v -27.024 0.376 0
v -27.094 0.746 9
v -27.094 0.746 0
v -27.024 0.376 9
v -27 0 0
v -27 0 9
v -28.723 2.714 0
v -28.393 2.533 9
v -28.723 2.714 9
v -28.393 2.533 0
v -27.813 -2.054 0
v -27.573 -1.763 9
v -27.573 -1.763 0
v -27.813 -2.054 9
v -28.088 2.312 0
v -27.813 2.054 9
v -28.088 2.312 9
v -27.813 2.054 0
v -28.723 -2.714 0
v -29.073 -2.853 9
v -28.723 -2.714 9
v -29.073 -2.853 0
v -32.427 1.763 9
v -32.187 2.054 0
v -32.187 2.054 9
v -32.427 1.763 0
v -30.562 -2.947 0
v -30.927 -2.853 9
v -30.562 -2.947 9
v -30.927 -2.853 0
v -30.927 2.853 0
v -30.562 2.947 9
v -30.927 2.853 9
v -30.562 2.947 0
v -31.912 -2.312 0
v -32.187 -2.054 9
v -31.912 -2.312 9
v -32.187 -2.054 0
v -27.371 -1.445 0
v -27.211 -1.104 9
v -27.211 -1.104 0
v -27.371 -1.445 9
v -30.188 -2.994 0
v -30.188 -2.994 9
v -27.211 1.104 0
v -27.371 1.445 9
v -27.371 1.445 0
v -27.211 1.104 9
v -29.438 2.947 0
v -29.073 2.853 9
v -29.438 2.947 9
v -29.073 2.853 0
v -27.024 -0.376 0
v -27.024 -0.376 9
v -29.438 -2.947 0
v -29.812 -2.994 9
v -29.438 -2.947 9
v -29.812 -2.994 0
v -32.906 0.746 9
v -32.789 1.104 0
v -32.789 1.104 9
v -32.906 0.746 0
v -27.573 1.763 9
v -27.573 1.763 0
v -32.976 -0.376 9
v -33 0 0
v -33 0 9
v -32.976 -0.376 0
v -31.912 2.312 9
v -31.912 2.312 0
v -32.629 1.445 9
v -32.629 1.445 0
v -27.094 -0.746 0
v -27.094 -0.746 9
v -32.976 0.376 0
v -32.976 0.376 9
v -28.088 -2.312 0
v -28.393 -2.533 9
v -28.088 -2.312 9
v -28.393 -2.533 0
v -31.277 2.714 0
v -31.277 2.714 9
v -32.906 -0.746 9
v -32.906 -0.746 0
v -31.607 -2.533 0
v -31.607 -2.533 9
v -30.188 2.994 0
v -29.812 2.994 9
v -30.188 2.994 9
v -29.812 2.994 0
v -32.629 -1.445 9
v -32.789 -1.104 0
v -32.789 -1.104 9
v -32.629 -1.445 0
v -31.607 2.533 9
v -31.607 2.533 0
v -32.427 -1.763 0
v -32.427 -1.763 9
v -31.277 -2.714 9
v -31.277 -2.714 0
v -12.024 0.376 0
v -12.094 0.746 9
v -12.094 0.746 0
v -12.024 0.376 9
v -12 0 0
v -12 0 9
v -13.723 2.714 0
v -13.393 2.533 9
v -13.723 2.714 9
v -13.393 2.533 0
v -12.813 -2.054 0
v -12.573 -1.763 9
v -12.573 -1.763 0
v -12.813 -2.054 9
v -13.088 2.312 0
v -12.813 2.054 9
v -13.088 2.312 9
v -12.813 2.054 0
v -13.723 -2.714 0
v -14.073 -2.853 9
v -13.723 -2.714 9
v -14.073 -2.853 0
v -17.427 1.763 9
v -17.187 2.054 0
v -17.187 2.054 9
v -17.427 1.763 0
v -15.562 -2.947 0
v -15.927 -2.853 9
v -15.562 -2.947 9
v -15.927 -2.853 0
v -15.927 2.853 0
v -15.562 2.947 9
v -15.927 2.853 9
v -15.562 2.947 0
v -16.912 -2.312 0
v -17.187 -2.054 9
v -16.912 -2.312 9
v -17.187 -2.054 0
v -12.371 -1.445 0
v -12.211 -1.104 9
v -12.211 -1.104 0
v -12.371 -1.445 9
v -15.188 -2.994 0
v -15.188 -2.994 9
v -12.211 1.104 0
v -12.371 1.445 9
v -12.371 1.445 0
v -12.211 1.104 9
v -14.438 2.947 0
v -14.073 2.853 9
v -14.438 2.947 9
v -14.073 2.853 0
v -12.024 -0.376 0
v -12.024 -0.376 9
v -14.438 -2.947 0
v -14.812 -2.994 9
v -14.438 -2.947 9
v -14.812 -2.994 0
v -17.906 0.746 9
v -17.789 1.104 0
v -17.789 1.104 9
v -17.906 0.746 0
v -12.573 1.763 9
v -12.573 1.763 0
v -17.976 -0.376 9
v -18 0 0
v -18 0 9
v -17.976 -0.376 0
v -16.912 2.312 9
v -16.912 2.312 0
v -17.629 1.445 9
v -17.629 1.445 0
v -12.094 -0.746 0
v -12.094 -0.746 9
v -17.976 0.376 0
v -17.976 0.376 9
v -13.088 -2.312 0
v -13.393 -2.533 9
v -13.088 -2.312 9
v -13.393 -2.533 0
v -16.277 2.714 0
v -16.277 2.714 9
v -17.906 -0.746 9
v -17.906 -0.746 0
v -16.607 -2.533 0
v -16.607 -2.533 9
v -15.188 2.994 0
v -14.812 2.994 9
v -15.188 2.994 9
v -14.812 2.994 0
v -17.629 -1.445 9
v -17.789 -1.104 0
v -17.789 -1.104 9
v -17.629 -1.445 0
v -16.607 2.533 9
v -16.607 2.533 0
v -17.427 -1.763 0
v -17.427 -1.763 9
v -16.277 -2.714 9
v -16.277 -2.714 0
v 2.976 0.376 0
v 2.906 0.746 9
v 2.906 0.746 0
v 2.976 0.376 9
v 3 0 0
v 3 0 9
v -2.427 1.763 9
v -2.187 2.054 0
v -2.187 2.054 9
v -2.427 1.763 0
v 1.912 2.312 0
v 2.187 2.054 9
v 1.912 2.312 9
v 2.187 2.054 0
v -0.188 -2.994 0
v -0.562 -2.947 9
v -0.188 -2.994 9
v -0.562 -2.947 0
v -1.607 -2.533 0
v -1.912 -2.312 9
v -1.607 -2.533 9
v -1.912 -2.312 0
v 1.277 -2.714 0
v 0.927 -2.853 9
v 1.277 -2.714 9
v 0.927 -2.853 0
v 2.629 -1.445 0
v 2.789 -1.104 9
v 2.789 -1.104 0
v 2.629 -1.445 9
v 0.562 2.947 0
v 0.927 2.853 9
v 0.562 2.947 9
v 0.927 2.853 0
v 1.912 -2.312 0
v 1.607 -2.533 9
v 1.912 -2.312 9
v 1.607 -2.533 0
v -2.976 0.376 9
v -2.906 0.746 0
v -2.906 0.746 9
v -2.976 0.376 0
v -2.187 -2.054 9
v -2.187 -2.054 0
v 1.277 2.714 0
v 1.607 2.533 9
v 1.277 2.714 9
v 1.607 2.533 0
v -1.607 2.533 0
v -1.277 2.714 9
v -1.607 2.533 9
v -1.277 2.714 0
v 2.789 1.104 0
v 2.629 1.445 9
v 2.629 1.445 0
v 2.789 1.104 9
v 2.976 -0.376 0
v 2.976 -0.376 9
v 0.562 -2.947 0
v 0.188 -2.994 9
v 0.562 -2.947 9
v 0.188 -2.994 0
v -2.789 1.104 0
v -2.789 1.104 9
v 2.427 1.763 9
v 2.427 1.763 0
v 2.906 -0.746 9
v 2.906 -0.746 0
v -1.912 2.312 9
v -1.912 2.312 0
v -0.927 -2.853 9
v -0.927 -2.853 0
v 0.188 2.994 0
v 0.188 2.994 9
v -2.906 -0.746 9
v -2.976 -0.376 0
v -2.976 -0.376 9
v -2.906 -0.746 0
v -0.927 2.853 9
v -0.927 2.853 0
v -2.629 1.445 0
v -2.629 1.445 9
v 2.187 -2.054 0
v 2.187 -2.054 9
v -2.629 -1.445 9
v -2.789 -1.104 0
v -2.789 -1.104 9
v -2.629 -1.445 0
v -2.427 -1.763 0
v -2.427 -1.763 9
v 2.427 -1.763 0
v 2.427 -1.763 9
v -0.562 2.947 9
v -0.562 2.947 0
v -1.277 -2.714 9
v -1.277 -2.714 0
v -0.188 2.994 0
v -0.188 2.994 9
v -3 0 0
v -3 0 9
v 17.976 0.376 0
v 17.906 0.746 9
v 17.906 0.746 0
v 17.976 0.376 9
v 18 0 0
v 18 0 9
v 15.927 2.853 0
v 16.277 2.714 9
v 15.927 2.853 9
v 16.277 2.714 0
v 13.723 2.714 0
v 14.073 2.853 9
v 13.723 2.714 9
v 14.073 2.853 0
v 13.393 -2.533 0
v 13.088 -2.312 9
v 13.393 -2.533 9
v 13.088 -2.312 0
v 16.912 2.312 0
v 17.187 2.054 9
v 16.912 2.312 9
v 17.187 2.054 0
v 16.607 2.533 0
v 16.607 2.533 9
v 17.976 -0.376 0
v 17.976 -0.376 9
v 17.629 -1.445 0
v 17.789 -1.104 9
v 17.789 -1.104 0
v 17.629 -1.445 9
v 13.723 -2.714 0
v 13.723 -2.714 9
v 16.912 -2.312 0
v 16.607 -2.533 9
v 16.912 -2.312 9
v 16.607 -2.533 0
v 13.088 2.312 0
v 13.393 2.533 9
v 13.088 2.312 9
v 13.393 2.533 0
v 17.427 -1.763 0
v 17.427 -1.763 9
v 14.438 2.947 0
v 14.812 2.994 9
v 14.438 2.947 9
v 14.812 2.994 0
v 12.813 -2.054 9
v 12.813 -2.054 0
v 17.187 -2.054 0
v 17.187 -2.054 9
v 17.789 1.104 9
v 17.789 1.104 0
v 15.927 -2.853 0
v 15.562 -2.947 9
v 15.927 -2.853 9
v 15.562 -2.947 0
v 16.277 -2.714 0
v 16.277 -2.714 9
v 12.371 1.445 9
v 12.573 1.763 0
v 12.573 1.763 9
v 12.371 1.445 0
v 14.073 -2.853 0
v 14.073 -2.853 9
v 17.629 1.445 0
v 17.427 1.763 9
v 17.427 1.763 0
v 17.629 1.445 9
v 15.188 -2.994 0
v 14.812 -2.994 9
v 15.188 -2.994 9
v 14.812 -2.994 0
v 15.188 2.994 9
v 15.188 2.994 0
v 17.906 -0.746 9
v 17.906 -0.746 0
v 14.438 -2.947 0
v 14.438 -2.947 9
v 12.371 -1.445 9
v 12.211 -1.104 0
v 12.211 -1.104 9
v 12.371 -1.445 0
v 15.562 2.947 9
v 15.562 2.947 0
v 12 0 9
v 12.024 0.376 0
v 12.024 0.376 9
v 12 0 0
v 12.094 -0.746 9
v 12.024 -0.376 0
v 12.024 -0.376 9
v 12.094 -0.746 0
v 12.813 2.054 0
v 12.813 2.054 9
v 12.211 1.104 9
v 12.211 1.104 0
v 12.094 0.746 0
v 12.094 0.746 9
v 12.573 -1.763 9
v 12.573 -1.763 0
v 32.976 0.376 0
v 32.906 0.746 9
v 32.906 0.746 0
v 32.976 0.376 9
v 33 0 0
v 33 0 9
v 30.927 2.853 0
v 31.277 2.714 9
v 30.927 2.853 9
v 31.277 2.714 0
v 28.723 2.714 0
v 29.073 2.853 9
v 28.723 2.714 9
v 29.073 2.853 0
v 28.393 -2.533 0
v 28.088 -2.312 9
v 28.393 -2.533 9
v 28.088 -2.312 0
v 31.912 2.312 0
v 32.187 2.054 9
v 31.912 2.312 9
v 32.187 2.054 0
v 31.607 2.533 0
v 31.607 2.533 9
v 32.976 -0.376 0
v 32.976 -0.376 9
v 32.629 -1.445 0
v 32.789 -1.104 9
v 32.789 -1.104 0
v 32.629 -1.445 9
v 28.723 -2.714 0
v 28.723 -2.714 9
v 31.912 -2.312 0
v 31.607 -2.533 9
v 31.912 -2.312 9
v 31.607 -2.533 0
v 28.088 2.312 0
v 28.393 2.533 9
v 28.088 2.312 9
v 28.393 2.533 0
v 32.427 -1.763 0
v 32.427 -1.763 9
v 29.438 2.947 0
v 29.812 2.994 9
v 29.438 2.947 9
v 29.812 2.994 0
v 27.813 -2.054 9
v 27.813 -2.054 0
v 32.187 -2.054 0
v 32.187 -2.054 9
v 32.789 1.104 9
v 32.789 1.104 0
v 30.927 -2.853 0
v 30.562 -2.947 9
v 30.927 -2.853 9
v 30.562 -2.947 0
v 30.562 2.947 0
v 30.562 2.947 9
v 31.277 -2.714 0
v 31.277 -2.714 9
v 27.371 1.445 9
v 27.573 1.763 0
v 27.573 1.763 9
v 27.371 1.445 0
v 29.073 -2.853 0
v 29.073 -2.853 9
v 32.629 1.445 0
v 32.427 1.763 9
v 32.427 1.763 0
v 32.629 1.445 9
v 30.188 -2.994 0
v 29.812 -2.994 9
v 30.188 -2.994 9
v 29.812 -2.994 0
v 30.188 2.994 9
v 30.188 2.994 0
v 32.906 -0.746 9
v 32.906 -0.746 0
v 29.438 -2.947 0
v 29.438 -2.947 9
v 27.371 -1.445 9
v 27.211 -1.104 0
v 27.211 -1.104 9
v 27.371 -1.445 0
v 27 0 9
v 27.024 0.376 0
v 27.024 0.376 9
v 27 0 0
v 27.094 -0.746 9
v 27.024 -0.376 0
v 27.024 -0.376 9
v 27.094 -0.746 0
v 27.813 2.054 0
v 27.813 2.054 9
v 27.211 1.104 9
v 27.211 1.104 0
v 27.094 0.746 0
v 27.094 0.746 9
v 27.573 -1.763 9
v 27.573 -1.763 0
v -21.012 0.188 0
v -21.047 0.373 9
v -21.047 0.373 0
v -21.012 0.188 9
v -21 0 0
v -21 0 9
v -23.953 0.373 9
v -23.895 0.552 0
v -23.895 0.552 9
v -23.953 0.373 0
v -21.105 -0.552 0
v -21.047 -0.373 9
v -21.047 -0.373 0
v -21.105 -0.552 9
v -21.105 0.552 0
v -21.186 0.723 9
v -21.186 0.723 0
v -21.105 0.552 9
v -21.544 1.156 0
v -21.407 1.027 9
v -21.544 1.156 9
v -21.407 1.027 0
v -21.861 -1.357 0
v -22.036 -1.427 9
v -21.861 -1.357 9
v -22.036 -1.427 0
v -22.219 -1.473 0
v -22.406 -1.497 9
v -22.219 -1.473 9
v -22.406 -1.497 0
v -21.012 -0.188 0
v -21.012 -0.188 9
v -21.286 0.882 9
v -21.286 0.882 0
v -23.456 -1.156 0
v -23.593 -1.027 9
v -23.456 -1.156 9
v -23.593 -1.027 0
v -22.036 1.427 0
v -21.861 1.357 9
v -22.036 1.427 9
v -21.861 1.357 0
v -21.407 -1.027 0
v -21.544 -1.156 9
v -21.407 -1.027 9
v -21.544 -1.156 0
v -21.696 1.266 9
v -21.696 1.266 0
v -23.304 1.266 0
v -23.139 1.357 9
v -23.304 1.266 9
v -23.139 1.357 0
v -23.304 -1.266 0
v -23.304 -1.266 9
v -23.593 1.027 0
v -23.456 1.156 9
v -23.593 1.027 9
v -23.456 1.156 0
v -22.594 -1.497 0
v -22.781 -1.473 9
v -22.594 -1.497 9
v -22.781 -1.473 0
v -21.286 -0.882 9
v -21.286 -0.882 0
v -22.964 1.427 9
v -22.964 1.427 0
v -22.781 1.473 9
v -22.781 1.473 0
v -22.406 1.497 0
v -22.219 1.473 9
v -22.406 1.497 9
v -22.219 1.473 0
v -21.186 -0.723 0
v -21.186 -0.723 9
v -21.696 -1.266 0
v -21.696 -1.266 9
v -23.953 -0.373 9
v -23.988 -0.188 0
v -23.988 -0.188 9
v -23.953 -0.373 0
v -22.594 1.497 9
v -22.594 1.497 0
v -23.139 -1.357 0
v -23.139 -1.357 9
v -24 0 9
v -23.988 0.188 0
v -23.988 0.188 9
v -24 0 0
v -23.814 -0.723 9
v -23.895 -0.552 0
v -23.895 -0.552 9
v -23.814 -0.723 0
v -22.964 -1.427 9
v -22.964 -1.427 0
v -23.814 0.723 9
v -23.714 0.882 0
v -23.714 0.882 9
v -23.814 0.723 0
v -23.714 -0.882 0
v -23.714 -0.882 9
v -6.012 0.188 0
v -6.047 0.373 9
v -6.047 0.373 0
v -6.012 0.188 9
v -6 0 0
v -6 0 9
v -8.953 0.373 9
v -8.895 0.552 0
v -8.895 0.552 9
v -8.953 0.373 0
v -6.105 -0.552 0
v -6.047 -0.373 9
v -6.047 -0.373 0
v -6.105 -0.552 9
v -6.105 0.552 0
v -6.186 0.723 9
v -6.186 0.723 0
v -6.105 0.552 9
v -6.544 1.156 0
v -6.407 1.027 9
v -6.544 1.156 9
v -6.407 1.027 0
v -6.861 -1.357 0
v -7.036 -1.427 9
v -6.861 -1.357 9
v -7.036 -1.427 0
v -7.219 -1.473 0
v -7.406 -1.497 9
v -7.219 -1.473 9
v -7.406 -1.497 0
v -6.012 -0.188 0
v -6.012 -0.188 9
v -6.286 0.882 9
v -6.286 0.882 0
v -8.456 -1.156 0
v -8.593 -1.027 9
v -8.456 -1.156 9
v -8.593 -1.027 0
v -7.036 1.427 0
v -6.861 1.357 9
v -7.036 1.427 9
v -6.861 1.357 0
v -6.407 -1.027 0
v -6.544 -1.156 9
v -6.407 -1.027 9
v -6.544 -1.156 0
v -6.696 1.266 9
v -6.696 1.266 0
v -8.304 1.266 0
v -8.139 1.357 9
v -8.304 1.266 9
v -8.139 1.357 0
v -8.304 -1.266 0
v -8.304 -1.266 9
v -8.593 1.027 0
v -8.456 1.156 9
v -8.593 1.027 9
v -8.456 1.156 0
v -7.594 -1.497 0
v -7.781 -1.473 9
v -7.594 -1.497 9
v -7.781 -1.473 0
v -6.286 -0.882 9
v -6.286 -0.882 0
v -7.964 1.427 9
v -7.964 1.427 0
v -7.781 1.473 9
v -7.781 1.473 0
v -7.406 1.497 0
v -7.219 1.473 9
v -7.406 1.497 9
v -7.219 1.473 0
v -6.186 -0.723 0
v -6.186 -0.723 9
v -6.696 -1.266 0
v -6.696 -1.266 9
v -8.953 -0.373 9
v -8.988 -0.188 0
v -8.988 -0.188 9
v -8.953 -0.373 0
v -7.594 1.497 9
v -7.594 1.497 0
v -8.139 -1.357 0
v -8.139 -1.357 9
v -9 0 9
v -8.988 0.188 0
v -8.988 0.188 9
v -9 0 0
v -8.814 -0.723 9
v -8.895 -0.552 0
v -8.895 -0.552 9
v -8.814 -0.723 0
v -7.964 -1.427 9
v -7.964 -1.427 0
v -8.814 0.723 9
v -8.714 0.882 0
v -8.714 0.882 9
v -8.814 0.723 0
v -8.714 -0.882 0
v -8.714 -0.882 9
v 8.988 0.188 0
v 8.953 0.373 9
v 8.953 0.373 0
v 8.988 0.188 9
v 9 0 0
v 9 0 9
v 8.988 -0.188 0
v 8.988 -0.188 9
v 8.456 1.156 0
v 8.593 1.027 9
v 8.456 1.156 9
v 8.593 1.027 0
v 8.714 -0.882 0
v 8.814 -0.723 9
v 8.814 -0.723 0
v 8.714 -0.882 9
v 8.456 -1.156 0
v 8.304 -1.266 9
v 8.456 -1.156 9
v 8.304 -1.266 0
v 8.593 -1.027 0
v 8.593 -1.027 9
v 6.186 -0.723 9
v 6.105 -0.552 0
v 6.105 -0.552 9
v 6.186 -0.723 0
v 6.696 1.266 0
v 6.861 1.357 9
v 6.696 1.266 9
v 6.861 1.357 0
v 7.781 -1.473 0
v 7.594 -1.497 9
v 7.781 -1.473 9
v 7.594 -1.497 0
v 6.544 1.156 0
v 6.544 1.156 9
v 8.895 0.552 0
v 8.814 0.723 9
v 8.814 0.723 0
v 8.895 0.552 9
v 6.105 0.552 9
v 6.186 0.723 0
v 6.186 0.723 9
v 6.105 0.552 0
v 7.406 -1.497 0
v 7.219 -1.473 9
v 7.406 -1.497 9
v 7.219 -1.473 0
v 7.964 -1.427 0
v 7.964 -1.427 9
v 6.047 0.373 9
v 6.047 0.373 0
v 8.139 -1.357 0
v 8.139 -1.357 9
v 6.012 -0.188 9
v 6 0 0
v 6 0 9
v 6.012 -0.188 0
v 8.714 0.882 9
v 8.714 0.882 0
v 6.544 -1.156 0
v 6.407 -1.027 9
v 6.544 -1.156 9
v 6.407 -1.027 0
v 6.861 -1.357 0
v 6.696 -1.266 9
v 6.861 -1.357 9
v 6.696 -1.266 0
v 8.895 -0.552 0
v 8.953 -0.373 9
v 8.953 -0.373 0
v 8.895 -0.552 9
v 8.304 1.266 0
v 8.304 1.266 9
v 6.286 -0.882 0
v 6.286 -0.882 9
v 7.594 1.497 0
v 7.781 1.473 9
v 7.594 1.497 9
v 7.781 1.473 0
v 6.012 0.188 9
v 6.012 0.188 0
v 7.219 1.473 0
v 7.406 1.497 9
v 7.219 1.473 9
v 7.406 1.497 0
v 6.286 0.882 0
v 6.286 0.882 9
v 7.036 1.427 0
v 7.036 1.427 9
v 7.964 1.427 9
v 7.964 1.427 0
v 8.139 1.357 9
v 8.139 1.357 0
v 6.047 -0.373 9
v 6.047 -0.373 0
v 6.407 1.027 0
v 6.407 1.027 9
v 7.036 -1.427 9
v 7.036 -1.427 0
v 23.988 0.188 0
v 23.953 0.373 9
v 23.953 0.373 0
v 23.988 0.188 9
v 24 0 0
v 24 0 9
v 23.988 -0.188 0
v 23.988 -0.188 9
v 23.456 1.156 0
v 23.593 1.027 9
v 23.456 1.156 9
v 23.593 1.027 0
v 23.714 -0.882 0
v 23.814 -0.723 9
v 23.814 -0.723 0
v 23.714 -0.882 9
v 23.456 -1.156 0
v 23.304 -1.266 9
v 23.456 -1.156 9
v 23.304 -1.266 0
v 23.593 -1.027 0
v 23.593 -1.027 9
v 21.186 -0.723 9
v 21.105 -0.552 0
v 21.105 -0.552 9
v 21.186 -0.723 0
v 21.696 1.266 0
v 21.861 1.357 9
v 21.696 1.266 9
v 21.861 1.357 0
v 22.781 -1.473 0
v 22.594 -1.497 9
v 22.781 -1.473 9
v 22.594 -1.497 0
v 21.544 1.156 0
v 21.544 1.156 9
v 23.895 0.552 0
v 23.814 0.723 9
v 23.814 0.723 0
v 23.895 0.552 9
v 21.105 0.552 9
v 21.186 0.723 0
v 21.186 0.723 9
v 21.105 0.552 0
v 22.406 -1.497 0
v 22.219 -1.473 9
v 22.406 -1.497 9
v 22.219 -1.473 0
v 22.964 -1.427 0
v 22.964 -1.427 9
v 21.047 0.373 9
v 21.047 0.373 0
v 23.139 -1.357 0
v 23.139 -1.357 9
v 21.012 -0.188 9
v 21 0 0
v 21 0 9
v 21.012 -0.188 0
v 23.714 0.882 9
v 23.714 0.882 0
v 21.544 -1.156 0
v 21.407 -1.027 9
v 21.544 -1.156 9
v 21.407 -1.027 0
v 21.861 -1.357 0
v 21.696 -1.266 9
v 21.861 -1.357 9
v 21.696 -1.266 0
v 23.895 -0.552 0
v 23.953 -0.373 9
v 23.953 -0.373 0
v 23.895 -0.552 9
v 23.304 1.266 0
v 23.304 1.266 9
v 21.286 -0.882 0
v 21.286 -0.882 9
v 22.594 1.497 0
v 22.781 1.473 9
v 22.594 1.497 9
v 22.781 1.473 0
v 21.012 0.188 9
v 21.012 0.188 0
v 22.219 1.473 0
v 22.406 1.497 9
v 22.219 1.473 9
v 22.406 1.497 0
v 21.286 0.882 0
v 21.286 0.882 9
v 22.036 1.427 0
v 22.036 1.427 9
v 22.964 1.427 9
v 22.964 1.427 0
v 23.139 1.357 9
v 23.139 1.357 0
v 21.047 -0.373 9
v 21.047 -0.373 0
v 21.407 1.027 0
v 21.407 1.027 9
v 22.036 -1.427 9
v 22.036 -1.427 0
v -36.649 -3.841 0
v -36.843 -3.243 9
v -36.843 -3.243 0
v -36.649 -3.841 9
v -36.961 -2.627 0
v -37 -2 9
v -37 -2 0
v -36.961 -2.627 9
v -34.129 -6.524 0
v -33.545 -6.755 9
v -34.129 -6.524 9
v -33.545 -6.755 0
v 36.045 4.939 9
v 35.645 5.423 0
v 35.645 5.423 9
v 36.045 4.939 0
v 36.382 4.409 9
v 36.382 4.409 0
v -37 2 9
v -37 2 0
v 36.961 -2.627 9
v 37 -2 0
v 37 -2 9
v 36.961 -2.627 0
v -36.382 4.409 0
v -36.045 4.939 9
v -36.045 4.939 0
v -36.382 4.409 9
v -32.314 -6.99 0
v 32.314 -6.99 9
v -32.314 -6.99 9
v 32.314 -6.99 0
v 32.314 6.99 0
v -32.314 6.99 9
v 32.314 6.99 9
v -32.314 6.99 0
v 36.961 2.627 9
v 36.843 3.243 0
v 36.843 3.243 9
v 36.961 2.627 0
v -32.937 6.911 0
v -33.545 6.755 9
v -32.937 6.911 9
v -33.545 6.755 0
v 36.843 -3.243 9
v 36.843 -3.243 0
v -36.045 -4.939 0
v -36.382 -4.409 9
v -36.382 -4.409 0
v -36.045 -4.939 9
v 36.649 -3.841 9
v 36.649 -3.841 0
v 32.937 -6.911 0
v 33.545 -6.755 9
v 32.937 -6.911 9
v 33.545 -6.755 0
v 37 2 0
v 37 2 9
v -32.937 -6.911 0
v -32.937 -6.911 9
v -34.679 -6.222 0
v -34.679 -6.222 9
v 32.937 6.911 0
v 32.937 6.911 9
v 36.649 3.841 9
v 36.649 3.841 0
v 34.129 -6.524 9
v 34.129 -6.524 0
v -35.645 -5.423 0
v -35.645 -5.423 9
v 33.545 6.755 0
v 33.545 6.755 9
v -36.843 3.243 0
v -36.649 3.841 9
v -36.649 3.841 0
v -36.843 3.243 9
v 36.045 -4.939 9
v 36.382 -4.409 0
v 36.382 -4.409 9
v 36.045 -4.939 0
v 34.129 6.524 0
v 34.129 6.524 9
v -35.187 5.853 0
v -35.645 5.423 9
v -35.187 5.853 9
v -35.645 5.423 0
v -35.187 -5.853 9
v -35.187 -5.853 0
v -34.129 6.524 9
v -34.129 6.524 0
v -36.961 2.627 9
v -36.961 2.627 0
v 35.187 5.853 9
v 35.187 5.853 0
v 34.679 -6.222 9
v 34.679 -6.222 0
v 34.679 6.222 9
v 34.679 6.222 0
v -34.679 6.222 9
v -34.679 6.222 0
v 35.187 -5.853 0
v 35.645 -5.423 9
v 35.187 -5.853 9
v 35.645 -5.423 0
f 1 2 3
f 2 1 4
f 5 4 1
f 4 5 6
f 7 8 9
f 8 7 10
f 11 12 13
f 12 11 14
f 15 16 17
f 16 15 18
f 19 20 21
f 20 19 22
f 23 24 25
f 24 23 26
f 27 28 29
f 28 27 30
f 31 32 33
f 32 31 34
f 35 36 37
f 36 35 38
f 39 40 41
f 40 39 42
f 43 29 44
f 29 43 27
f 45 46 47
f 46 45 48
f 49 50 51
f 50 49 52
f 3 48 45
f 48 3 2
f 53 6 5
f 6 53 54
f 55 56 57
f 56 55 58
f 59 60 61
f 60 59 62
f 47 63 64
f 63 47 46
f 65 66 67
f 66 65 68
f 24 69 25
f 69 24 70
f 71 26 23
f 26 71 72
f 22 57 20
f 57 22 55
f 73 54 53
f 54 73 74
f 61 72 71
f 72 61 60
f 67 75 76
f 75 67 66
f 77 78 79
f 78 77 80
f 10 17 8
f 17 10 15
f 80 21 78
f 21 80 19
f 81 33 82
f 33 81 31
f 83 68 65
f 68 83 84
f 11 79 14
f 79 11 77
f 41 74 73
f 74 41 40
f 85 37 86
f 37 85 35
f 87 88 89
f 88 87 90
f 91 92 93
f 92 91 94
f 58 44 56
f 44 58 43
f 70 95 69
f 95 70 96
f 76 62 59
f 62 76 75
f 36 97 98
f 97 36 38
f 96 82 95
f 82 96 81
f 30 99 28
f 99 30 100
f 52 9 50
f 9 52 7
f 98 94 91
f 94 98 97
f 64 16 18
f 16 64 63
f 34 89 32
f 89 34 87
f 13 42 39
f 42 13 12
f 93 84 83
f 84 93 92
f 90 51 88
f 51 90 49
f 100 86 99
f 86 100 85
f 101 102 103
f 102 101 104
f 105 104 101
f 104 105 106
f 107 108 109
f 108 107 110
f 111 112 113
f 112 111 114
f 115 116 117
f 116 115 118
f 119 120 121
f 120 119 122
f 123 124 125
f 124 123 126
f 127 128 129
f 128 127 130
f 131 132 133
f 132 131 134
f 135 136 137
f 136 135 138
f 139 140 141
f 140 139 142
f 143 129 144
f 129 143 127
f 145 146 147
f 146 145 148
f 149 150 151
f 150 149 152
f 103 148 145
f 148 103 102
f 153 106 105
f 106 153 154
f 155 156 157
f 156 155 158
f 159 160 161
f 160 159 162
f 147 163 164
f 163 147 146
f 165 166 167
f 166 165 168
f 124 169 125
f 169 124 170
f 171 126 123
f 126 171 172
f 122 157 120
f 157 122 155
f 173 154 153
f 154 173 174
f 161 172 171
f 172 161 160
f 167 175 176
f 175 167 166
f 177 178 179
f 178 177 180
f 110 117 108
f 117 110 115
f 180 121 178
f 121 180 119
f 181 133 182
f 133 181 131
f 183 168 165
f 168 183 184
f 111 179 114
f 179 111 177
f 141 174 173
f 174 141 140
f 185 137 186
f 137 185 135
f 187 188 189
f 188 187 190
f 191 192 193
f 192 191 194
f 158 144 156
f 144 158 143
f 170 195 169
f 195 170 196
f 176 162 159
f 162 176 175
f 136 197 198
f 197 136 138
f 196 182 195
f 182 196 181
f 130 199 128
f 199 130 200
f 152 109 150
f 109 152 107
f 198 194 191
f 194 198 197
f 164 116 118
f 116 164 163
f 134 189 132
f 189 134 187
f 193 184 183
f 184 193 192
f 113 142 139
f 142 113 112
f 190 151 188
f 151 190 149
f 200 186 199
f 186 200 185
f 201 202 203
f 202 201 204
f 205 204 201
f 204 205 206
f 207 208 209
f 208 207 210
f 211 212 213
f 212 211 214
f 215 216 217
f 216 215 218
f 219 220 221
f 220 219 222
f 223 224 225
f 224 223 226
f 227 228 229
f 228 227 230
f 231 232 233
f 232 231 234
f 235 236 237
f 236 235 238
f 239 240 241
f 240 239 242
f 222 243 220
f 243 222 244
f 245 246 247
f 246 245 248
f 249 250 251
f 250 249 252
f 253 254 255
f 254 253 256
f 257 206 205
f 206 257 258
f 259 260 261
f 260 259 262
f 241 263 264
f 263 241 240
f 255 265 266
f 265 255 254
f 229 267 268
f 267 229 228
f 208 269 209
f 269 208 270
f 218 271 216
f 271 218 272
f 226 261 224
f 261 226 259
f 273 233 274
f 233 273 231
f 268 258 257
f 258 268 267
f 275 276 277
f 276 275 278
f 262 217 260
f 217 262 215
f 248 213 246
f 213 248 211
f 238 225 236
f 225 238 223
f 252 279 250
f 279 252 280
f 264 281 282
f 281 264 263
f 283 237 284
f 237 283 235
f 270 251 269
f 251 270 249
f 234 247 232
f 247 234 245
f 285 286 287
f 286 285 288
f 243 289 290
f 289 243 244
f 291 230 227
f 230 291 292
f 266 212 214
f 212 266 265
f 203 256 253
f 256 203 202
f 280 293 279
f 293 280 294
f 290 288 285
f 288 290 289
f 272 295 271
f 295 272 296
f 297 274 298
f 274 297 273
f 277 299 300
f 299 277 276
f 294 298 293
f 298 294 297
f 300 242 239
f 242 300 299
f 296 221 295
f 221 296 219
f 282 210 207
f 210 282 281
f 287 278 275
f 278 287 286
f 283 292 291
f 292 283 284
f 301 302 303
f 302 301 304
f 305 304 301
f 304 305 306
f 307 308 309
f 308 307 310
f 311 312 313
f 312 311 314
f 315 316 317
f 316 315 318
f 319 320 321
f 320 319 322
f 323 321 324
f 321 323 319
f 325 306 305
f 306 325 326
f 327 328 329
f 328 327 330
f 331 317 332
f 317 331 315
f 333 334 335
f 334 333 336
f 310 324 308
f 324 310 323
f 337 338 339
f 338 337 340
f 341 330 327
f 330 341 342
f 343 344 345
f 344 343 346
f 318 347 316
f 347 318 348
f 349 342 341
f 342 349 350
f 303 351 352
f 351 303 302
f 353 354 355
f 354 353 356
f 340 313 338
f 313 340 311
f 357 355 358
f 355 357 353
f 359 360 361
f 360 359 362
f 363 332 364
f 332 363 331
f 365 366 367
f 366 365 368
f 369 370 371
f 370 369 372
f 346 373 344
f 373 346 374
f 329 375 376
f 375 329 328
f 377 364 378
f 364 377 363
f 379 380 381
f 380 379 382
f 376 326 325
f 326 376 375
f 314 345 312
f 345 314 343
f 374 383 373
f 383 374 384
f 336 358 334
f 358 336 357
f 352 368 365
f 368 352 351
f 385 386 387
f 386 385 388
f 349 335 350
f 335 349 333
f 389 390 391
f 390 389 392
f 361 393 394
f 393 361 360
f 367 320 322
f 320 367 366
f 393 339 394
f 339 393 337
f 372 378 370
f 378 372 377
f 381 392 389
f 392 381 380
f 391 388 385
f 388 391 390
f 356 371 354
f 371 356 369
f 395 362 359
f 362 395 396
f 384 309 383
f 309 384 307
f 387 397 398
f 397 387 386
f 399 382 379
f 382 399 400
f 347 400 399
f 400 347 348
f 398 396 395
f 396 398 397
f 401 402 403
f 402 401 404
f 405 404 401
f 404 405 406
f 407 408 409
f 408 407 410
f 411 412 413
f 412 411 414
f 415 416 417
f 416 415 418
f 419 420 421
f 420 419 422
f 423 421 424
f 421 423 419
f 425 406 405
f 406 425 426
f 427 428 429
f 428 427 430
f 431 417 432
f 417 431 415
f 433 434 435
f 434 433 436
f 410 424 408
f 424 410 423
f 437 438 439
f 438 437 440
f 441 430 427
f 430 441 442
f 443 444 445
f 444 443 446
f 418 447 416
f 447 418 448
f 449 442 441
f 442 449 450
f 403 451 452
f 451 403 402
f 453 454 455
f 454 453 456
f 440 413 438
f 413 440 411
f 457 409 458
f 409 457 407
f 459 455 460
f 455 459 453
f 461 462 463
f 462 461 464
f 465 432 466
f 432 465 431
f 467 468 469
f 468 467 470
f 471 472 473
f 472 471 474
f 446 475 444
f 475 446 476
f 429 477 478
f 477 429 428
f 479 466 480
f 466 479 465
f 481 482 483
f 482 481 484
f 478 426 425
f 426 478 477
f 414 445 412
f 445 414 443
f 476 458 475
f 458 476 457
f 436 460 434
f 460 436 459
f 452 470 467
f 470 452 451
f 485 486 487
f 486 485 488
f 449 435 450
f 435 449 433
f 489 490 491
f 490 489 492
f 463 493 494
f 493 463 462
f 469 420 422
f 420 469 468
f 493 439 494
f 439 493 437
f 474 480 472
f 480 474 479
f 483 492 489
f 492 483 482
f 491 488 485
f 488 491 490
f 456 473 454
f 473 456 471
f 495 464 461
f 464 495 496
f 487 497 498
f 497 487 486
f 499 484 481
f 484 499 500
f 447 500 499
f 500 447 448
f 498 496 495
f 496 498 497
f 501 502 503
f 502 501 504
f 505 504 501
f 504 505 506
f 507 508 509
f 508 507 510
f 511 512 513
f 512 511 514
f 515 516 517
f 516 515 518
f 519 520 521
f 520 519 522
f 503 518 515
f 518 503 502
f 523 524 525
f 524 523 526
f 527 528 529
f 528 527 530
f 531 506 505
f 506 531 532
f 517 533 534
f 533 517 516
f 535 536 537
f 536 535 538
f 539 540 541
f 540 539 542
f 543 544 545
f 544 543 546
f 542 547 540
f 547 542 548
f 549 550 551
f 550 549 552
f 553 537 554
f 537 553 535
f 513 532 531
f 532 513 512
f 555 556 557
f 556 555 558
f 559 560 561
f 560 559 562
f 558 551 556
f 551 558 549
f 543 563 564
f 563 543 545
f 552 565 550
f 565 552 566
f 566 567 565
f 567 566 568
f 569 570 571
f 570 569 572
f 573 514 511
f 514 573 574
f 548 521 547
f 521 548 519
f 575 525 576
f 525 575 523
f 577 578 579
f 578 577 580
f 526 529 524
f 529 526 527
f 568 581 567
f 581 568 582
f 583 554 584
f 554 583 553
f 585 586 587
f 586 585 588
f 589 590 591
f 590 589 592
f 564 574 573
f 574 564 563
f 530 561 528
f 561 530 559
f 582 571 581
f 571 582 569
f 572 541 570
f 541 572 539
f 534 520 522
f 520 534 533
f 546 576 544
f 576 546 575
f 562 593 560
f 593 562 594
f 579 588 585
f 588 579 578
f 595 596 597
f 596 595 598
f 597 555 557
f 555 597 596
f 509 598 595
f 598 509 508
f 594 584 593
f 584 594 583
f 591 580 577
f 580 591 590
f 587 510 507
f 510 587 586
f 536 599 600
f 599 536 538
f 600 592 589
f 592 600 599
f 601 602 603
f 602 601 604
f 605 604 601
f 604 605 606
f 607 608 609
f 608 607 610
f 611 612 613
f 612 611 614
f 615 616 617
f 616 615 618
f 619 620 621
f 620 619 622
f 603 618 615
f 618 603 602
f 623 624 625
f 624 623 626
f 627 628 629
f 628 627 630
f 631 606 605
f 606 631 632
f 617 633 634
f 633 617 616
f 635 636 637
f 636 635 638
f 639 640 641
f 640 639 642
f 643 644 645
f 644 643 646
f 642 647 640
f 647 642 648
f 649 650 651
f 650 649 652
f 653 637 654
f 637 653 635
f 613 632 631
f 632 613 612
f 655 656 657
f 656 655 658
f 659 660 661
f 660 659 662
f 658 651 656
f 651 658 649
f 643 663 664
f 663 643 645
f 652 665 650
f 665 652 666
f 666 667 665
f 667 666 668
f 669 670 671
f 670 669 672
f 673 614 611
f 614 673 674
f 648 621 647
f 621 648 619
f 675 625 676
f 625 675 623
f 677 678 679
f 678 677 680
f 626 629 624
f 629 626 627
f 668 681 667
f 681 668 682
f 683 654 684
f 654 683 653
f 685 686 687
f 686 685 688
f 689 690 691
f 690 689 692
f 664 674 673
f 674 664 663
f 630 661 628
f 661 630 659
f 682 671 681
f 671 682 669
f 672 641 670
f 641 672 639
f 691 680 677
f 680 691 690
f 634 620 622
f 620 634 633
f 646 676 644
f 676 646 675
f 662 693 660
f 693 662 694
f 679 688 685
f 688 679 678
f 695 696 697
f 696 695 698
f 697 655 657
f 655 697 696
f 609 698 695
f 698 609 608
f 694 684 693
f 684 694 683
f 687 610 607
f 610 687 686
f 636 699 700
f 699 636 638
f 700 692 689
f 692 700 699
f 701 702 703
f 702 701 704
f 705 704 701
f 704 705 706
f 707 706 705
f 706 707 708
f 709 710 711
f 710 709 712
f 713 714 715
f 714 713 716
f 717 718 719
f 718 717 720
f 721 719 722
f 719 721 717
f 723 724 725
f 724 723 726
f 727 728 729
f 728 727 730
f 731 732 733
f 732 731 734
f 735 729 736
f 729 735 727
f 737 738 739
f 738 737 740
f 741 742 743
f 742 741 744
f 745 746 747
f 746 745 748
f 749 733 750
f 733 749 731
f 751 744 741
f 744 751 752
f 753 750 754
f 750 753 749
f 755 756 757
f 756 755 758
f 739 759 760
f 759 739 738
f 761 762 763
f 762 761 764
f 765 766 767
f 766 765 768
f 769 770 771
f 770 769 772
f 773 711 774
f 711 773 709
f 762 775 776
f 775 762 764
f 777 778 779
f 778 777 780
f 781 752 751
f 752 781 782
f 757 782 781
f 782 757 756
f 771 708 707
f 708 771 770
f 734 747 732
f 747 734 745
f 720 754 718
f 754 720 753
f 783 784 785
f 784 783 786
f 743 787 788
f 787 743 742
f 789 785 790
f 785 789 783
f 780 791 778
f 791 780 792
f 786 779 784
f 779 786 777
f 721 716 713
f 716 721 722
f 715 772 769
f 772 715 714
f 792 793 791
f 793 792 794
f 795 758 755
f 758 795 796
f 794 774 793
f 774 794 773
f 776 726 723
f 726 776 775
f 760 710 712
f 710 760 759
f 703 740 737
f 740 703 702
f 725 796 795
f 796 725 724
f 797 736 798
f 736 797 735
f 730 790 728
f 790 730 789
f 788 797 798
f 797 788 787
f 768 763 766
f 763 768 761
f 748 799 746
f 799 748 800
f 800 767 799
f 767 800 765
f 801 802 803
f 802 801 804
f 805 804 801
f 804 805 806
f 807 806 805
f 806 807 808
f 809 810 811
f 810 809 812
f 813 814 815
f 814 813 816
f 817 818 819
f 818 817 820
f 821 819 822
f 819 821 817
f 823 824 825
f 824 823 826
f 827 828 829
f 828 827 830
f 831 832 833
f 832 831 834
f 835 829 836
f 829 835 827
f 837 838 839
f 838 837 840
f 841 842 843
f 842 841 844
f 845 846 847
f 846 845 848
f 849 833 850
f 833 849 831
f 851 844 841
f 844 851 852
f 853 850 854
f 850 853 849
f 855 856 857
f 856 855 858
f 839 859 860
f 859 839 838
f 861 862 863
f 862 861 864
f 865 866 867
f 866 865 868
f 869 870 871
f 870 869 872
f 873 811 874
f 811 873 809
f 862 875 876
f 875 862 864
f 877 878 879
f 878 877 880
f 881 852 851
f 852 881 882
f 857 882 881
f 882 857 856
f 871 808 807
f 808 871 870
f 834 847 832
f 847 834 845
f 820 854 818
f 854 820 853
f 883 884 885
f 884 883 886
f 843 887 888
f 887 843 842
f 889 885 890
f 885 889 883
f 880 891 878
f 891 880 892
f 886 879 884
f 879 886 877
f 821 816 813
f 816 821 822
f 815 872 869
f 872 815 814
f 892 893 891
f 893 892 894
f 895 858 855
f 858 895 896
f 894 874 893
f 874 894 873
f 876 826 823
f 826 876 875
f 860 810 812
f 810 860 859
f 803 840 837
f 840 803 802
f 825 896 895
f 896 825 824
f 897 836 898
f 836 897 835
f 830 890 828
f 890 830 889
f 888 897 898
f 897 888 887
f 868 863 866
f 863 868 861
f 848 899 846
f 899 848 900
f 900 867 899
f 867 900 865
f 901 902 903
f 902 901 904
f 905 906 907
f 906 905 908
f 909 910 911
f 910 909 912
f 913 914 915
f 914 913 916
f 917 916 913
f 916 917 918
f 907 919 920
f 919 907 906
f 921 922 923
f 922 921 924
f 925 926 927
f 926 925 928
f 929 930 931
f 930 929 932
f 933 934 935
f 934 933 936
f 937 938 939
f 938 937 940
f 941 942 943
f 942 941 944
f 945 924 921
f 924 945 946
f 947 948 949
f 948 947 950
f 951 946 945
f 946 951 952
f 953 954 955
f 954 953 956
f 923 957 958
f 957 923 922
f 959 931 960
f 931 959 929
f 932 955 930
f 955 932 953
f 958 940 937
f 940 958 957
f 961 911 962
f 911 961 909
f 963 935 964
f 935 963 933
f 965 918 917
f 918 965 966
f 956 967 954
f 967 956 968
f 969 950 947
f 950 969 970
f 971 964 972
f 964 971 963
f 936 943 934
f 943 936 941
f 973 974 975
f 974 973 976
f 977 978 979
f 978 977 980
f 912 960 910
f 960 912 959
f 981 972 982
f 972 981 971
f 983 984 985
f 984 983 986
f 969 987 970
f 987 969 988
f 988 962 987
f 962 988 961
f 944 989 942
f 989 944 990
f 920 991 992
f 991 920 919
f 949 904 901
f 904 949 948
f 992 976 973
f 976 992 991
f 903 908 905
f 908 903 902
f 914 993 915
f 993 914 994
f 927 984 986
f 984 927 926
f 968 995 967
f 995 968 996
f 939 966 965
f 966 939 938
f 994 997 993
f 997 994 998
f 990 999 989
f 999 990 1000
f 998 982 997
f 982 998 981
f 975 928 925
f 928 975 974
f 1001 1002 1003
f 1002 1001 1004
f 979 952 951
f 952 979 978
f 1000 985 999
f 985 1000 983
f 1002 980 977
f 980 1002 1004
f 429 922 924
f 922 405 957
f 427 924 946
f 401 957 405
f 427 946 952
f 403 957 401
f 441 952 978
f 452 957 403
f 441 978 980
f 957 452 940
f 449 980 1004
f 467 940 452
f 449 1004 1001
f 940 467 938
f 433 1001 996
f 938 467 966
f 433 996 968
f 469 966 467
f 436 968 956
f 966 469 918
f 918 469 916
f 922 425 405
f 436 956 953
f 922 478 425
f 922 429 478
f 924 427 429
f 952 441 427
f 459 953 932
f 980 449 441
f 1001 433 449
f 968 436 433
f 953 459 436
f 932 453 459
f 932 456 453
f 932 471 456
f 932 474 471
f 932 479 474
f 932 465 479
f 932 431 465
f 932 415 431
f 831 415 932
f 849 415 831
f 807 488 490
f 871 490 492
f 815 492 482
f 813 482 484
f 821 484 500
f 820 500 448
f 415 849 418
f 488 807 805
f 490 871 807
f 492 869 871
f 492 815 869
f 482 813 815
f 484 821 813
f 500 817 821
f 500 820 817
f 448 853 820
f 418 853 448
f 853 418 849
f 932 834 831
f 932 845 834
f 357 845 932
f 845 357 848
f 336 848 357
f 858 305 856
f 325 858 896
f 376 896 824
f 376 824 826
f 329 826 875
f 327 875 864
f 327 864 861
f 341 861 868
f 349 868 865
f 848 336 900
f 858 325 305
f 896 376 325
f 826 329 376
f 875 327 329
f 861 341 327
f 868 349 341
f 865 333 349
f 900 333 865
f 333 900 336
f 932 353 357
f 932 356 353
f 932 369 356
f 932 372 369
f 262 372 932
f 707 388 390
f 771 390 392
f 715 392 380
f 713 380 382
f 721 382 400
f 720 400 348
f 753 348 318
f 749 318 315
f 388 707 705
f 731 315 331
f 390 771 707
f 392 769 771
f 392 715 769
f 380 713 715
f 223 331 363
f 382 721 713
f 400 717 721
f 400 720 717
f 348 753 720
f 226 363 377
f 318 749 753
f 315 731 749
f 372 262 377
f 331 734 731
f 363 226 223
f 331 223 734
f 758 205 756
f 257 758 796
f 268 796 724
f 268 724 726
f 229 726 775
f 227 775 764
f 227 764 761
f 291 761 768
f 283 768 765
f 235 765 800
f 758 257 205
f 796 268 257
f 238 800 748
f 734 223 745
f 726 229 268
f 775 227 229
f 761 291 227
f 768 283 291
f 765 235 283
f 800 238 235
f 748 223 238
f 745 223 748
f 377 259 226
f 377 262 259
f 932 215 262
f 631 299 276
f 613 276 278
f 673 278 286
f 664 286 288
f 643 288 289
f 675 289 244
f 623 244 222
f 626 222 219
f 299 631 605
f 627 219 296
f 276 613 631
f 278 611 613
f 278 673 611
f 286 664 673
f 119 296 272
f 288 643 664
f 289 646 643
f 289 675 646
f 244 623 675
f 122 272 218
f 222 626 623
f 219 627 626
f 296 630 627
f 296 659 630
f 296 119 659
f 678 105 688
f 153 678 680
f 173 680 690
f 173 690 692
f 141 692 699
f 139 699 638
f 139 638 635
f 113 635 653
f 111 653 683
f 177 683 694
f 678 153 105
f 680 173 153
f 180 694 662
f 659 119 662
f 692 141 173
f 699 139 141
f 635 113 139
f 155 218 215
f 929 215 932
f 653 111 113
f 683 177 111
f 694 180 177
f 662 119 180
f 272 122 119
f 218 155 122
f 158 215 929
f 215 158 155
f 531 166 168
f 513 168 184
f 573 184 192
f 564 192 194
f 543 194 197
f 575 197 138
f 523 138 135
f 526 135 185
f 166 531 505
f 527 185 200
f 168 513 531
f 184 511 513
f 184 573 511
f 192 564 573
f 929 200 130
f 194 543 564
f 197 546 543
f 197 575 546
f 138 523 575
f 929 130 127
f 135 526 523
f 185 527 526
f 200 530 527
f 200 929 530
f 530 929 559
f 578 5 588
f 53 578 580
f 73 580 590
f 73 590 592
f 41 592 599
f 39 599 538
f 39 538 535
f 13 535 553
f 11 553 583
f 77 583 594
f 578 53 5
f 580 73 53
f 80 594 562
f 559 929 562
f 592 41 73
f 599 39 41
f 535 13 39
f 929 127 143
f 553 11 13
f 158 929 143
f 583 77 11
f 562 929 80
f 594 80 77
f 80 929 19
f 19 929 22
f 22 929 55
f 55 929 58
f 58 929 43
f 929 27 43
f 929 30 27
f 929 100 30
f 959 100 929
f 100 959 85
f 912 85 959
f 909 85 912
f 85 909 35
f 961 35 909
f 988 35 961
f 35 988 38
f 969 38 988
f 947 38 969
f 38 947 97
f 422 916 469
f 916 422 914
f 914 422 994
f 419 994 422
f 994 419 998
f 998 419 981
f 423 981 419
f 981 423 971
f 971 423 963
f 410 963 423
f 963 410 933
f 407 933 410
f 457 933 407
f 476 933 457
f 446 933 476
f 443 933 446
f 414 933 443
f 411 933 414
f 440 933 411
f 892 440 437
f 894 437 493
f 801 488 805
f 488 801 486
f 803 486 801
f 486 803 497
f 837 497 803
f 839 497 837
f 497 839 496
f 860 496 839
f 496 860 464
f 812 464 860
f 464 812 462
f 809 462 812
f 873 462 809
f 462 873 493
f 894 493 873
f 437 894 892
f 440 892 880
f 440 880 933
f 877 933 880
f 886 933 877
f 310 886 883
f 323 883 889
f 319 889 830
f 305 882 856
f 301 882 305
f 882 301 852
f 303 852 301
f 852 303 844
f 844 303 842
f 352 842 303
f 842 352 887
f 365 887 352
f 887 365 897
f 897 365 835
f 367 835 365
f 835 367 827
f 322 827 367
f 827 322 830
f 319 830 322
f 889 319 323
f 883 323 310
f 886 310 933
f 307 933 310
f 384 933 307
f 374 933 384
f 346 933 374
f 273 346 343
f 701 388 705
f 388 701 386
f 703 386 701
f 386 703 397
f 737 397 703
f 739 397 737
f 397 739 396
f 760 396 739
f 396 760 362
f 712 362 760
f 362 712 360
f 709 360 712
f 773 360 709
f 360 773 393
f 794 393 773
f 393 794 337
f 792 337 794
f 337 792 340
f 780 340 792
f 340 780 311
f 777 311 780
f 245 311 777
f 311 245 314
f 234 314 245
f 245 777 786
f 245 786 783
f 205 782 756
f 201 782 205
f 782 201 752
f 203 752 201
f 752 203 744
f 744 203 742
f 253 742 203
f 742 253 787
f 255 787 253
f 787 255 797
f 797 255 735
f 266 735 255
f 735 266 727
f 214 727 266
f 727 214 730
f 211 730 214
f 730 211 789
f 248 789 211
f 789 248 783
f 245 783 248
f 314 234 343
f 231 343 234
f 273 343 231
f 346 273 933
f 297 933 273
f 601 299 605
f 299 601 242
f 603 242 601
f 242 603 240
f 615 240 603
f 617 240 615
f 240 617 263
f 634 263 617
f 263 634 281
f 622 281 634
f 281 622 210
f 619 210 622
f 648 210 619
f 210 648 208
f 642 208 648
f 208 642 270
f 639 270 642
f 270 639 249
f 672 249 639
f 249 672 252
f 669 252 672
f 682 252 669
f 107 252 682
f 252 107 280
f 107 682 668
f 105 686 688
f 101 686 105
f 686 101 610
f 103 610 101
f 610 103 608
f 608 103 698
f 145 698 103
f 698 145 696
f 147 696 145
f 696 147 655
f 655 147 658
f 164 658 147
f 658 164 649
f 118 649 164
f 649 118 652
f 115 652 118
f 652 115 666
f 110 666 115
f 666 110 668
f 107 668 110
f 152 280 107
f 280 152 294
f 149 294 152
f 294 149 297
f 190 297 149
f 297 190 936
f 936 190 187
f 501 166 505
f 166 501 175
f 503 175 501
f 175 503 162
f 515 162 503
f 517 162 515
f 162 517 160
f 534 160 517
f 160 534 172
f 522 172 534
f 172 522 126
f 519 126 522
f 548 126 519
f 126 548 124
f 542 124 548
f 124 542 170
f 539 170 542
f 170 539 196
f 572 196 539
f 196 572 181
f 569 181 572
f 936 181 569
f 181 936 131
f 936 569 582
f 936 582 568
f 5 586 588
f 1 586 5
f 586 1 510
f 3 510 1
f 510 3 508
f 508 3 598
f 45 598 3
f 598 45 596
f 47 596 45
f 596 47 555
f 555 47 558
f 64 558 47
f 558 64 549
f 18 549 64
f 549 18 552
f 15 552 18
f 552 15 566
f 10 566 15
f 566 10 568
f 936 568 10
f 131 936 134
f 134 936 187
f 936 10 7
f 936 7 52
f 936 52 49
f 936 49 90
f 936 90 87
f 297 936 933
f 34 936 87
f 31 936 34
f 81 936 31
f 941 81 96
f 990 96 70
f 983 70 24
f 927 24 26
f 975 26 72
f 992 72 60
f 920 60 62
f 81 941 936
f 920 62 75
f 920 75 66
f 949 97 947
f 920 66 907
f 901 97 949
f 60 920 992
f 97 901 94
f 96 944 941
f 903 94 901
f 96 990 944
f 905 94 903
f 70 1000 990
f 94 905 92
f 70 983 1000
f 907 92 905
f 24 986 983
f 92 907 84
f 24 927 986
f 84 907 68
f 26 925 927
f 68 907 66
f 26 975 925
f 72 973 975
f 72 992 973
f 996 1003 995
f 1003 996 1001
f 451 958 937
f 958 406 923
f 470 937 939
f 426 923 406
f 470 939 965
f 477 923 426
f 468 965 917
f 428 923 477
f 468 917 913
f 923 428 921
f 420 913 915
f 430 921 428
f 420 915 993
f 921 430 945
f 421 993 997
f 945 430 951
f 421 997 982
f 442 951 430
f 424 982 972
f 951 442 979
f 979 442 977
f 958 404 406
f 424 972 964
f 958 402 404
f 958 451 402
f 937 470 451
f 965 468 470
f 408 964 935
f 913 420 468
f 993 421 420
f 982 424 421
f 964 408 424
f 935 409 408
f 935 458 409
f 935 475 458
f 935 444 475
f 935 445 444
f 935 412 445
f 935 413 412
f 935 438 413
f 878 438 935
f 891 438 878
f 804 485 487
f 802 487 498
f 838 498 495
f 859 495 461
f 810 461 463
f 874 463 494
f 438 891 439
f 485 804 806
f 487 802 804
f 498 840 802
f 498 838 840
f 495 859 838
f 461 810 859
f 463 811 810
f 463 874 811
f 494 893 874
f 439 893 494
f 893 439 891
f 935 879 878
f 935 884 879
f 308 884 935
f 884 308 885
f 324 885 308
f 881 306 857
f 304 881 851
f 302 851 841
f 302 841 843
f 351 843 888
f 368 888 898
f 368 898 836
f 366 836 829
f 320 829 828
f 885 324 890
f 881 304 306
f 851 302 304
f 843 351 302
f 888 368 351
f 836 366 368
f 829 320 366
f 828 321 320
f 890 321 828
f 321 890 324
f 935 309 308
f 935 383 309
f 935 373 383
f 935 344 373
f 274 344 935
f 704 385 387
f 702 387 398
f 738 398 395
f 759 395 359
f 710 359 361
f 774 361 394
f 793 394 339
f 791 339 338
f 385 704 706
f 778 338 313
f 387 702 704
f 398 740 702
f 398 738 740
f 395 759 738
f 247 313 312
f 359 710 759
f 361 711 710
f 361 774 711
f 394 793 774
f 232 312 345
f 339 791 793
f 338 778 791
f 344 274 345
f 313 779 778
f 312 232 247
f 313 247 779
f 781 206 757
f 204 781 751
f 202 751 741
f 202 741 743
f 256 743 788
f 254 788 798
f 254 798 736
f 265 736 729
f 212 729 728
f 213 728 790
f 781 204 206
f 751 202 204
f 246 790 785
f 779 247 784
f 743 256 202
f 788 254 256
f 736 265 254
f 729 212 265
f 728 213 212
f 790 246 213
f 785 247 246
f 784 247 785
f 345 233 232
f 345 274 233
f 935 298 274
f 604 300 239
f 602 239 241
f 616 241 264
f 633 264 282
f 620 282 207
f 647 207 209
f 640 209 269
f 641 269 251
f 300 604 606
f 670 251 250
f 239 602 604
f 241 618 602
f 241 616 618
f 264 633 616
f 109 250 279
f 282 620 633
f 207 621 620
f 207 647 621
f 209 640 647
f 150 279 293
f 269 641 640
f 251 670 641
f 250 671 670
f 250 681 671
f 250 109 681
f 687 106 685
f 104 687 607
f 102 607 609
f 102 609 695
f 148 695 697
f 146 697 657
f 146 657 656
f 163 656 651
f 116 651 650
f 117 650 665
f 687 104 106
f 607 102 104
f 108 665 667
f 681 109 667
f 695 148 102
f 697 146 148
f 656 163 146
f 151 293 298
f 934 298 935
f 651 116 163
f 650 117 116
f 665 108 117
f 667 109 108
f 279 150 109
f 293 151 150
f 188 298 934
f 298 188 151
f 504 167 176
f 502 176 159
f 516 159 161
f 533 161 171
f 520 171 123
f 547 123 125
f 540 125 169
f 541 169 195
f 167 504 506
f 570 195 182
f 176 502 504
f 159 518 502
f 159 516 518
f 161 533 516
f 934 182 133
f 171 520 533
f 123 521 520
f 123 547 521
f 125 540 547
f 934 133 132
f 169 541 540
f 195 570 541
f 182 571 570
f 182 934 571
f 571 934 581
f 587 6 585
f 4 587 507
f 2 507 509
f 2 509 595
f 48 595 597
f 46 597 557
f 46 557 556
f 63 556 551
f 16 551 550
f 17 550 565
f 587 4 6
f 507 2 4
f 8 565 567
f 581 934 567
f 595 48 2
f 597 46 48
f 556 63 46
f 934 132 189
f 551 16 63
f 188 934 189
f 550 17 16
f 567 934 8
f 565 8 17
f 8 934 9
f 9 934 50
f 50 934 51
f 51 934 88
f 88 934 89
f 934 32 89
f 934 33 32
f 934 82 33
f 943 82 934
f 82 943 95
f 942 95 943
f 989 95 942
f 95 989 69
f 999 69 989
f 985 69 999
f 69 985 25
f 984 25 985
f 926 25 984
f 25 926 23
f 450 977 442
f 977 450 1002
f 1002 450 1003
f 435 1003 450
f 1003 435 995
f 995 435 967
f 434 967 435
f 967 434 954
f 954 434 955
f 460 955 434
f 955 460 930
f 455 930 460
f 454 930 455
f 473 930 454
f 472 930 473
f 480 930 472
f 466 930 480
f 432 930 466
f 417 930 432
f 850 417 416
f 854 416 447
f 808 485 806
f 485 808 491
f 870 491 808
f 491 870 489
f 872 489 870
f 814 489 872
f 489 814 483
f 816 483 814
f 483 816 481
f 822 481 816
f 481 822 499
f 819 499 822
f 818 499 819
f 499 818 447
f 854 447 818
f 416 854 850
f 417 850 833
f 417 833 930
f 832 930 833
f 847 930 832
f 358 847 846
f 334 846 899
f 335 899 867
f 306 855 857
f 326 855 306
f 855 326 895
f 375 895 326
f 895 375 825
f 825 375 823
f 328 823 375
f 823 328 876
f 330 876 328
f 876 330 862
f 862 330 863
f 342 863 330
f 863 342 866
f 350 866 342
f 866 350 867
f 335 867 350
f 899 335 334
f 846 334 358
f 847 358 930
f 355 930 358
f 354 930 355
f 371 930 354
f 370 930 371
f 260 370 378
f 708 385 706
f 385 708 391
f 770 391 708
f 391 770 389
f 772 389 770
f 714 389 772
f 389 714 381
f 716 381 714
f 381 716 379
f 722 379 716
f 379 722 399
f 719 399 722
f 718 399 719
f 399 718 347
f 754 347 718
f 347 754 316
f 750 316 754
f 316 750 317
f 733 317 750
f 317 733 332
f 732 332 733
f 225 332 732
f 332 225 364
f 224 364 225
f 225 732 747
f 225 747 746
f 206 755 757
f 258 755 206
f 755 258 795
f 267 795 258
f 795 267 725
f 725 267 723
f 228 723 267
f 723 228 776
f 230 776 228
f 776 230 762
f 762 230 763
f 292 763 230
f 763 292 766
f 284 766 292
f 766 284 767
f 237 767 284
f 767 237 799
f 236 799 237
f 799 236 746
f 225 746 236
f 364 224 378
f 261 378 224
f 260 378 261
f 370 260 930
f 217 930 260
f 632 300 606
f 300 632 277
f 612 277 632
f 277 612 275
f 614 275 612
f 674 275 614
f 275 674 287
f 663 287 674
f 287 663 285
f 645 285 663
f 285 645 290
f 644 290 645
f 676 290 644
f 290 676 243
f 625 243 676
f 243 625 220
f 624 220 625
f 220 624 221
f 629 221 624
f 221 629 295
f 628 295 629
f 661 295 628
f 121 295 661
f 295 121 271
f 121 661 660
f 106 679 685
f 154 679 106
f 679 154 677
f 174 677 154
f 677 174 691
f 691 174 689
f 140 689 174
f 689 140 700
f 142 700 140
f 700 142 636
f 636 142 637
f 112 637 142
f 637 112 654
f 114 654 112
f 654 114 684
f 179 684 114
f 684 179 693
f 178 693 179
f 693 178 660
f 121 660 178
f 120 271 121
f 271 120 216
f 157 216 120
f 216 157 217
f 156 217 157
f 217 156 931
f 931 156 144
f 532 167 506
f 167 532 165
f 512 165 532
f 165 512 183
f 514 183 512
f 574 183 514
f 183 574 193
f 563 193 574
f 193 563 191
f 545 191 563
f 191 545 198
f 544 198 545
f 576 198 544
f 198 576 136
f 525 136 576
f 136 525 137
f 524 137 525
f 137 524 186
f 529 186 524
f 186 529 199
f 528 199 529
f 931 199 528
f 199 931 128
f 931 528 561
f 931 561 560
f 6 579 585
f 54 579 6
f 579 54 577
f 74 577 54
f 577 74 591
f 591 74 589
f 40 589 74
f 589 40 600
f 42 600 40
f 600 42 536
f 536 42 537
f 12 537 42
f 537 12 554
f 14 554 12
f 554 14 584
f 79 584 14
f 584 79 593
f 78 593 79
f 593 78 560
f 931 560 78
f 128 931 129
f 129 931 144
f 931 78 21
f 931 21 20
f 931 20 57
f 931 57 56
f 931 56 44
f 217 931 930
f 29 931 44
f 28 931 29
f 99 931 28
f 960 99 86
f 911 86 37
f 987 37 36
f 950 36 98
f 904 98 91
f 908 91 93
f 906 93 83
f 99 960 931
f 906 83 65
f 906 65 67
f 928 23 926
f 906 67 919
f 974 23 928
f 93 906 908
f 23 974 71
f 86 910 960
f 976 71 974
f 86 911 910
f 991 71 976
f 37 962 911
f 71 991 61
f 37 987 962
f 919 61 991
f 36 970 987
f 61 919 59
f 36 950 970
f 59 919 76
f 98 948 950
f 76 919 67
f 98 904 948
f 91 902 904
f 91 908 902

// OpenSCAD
$fn = 50;


difference() {
	union() {
		hull() {
			translate(v = [-32.0000000000, 2.0000000000, 0]) {
				cylinder(h = 9, r = 5);
			}
			translate(v = [32.0000000000, 2.0000000000, 0]) {
				cylinder(h = 9, r = 5);
			}
			translate(v = [-32.0000000000, -2.0000000000, 0]) {
				cylinder(h = 9, r = 5);
			}
			translate(v = [32.0000000000, -2.0000000000, 0]) {
				cylinder(h = 9, r = 5);
			}
		}
	}
	union() {
		translate(v = [-30.0000000000, 0.0000000000, 0]) {
			translate(v = [0, 0, -100]) {
				cylinder(h = 200, r = 3.0000000000);
			}
		}
		translate(v = [-15.0000000000, 0.0000000000, 0]) {
			translate(v = [0, 0, -100]) {
				cylinder(h = 200, r = 3.0000000000);
			}
		}
		translate(v = [0, 0, -100]) {
			cylinder(h = 200, r = 3.0000000000);
		}
		translate(v = [15.0000000000, 0.0000000000, 0]) {
			translate(v = [0, 0, -100]) {
				cylinder(h = 200, r = 3.0000000000);
			}
		}
		translate(v = [30.0000000000, 0.0000000000, 0]) {
			translate(v = [0, 0, -100]) {
				cylinder(h = 200, r = 3.0000000000);
			}
		}
		translate(v = [-30.0000000000, 0.0000000000, 0]) {
			translate(v = [0, 0, -100]) {
				cylinder(h = 200, r = 1.5000000000);
			}
		}
		translate(v = [-22.5000000000, 0.0000000000, 0]) {
			translate(v = [0, 0, -100]) {
				cylinder(h = 200, r = 1.5000000000);
			}
		}
		translate(v = [-15.0000000000, 0.0000000000, 0]) {
			translate(v = [0, 0, -100]) {
				cylinder(h = 200, r = 1.5000000000);
			}
		}
		translate(v = [-7.5000000000, 0.0000000000, 0]) {
			translate(v = [0, 0, -100]) {
				cylinder(h = 200, r = 1.5000000000);
			}
		}
		translate(v = [0, 0, -100]) {
			cylinder(h = 200, r = 1.5000000000);
		}
		translate(v = [7.5000000000, 0.0000000000, 0]) {
			translate(v = [0, 0, -100]) {
				cylinder(h = 200, r = 1.5000000000);
			}
		}
		translate(v = [15.0000000000, 0.0000000000, 0]) {
			translate(v = [0, 0, -100]) {
				cylinder(h = 200, r = 1.5000000000);
			}
		}
		translate(v = [22.5000000000, 0.0000000000, 0]) {
			translate(v = [0, 0, -100]) {
				cylinder(h = 200, r = 1.5000000000);
			}
		}
		translate(v = [30.0000000000, 0.0000000000, 0]) {
			translate(v = [0, 0, -100]) {
				cylinder(h = 200, r = 1.5000000000);
			}
		}
	}
}
